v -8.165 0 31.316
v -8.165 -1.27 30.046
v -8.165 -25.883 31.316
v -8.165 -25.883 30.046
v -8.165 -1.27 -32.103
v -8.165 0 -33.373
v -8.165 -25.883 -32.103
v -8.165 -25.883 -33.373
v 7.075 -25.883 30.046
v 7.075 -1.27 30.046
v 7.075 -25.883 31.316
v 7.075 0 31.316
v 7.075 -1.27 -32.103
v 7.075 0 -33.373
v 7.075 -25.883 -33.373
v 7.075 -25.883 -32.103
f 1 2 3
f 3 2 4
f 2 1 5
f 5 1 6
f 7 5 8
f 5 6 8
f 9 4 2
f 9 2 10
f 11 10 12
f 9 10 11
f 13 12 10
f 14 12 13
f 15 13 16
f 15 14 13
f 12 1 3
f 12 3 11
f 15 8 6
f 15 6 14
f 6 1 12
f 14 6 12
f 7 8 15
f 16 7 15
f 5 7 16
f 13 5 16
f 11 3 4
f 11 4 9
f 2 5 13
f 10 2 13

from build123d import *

# Parameters (mm, degrees)
F0_W     = 15.24
F0_H     = 64.68872
F1_DEPTH = 1.27
F2_W     = 15.24
F2_H     = 24.6126
F3_DEPTH = 1.27
F4_W     = 15.24
F4_H     = 24.6126
F5_DEPTH = 1.27


with BuildPart() as f1:
    # F0 (on Front) → F1 (new body)
    with BuildSketch(Plane.XZ):
        with Locations((-0.545189, -1.028404)):
            Rectangle(F0_W, F0_H)
    extrude(amount=F1_DEPTH)

    # F2 (on face) → F3 (join)
    with BuildSketch(Plane.XY.offset(31.315956)):
        with Locations((-0.545189, -13.5763)):
            Rectangle(F2_W, F2_H)
    extrude(amount=-F3_DEPTH)

    # F4 (on face) → F5 (join)
    with BuildSketch(Plane(origin=(0, 0, -33.372764), x_dir=(1, 0, 0), z_dir=(0, 0, -1))):
        with Locations((-0.545189, 13.5763)):
            Rectangle(F4_W, F4_H)
    extrude(amount=-F5_DEPTH)


solid = f1.part
